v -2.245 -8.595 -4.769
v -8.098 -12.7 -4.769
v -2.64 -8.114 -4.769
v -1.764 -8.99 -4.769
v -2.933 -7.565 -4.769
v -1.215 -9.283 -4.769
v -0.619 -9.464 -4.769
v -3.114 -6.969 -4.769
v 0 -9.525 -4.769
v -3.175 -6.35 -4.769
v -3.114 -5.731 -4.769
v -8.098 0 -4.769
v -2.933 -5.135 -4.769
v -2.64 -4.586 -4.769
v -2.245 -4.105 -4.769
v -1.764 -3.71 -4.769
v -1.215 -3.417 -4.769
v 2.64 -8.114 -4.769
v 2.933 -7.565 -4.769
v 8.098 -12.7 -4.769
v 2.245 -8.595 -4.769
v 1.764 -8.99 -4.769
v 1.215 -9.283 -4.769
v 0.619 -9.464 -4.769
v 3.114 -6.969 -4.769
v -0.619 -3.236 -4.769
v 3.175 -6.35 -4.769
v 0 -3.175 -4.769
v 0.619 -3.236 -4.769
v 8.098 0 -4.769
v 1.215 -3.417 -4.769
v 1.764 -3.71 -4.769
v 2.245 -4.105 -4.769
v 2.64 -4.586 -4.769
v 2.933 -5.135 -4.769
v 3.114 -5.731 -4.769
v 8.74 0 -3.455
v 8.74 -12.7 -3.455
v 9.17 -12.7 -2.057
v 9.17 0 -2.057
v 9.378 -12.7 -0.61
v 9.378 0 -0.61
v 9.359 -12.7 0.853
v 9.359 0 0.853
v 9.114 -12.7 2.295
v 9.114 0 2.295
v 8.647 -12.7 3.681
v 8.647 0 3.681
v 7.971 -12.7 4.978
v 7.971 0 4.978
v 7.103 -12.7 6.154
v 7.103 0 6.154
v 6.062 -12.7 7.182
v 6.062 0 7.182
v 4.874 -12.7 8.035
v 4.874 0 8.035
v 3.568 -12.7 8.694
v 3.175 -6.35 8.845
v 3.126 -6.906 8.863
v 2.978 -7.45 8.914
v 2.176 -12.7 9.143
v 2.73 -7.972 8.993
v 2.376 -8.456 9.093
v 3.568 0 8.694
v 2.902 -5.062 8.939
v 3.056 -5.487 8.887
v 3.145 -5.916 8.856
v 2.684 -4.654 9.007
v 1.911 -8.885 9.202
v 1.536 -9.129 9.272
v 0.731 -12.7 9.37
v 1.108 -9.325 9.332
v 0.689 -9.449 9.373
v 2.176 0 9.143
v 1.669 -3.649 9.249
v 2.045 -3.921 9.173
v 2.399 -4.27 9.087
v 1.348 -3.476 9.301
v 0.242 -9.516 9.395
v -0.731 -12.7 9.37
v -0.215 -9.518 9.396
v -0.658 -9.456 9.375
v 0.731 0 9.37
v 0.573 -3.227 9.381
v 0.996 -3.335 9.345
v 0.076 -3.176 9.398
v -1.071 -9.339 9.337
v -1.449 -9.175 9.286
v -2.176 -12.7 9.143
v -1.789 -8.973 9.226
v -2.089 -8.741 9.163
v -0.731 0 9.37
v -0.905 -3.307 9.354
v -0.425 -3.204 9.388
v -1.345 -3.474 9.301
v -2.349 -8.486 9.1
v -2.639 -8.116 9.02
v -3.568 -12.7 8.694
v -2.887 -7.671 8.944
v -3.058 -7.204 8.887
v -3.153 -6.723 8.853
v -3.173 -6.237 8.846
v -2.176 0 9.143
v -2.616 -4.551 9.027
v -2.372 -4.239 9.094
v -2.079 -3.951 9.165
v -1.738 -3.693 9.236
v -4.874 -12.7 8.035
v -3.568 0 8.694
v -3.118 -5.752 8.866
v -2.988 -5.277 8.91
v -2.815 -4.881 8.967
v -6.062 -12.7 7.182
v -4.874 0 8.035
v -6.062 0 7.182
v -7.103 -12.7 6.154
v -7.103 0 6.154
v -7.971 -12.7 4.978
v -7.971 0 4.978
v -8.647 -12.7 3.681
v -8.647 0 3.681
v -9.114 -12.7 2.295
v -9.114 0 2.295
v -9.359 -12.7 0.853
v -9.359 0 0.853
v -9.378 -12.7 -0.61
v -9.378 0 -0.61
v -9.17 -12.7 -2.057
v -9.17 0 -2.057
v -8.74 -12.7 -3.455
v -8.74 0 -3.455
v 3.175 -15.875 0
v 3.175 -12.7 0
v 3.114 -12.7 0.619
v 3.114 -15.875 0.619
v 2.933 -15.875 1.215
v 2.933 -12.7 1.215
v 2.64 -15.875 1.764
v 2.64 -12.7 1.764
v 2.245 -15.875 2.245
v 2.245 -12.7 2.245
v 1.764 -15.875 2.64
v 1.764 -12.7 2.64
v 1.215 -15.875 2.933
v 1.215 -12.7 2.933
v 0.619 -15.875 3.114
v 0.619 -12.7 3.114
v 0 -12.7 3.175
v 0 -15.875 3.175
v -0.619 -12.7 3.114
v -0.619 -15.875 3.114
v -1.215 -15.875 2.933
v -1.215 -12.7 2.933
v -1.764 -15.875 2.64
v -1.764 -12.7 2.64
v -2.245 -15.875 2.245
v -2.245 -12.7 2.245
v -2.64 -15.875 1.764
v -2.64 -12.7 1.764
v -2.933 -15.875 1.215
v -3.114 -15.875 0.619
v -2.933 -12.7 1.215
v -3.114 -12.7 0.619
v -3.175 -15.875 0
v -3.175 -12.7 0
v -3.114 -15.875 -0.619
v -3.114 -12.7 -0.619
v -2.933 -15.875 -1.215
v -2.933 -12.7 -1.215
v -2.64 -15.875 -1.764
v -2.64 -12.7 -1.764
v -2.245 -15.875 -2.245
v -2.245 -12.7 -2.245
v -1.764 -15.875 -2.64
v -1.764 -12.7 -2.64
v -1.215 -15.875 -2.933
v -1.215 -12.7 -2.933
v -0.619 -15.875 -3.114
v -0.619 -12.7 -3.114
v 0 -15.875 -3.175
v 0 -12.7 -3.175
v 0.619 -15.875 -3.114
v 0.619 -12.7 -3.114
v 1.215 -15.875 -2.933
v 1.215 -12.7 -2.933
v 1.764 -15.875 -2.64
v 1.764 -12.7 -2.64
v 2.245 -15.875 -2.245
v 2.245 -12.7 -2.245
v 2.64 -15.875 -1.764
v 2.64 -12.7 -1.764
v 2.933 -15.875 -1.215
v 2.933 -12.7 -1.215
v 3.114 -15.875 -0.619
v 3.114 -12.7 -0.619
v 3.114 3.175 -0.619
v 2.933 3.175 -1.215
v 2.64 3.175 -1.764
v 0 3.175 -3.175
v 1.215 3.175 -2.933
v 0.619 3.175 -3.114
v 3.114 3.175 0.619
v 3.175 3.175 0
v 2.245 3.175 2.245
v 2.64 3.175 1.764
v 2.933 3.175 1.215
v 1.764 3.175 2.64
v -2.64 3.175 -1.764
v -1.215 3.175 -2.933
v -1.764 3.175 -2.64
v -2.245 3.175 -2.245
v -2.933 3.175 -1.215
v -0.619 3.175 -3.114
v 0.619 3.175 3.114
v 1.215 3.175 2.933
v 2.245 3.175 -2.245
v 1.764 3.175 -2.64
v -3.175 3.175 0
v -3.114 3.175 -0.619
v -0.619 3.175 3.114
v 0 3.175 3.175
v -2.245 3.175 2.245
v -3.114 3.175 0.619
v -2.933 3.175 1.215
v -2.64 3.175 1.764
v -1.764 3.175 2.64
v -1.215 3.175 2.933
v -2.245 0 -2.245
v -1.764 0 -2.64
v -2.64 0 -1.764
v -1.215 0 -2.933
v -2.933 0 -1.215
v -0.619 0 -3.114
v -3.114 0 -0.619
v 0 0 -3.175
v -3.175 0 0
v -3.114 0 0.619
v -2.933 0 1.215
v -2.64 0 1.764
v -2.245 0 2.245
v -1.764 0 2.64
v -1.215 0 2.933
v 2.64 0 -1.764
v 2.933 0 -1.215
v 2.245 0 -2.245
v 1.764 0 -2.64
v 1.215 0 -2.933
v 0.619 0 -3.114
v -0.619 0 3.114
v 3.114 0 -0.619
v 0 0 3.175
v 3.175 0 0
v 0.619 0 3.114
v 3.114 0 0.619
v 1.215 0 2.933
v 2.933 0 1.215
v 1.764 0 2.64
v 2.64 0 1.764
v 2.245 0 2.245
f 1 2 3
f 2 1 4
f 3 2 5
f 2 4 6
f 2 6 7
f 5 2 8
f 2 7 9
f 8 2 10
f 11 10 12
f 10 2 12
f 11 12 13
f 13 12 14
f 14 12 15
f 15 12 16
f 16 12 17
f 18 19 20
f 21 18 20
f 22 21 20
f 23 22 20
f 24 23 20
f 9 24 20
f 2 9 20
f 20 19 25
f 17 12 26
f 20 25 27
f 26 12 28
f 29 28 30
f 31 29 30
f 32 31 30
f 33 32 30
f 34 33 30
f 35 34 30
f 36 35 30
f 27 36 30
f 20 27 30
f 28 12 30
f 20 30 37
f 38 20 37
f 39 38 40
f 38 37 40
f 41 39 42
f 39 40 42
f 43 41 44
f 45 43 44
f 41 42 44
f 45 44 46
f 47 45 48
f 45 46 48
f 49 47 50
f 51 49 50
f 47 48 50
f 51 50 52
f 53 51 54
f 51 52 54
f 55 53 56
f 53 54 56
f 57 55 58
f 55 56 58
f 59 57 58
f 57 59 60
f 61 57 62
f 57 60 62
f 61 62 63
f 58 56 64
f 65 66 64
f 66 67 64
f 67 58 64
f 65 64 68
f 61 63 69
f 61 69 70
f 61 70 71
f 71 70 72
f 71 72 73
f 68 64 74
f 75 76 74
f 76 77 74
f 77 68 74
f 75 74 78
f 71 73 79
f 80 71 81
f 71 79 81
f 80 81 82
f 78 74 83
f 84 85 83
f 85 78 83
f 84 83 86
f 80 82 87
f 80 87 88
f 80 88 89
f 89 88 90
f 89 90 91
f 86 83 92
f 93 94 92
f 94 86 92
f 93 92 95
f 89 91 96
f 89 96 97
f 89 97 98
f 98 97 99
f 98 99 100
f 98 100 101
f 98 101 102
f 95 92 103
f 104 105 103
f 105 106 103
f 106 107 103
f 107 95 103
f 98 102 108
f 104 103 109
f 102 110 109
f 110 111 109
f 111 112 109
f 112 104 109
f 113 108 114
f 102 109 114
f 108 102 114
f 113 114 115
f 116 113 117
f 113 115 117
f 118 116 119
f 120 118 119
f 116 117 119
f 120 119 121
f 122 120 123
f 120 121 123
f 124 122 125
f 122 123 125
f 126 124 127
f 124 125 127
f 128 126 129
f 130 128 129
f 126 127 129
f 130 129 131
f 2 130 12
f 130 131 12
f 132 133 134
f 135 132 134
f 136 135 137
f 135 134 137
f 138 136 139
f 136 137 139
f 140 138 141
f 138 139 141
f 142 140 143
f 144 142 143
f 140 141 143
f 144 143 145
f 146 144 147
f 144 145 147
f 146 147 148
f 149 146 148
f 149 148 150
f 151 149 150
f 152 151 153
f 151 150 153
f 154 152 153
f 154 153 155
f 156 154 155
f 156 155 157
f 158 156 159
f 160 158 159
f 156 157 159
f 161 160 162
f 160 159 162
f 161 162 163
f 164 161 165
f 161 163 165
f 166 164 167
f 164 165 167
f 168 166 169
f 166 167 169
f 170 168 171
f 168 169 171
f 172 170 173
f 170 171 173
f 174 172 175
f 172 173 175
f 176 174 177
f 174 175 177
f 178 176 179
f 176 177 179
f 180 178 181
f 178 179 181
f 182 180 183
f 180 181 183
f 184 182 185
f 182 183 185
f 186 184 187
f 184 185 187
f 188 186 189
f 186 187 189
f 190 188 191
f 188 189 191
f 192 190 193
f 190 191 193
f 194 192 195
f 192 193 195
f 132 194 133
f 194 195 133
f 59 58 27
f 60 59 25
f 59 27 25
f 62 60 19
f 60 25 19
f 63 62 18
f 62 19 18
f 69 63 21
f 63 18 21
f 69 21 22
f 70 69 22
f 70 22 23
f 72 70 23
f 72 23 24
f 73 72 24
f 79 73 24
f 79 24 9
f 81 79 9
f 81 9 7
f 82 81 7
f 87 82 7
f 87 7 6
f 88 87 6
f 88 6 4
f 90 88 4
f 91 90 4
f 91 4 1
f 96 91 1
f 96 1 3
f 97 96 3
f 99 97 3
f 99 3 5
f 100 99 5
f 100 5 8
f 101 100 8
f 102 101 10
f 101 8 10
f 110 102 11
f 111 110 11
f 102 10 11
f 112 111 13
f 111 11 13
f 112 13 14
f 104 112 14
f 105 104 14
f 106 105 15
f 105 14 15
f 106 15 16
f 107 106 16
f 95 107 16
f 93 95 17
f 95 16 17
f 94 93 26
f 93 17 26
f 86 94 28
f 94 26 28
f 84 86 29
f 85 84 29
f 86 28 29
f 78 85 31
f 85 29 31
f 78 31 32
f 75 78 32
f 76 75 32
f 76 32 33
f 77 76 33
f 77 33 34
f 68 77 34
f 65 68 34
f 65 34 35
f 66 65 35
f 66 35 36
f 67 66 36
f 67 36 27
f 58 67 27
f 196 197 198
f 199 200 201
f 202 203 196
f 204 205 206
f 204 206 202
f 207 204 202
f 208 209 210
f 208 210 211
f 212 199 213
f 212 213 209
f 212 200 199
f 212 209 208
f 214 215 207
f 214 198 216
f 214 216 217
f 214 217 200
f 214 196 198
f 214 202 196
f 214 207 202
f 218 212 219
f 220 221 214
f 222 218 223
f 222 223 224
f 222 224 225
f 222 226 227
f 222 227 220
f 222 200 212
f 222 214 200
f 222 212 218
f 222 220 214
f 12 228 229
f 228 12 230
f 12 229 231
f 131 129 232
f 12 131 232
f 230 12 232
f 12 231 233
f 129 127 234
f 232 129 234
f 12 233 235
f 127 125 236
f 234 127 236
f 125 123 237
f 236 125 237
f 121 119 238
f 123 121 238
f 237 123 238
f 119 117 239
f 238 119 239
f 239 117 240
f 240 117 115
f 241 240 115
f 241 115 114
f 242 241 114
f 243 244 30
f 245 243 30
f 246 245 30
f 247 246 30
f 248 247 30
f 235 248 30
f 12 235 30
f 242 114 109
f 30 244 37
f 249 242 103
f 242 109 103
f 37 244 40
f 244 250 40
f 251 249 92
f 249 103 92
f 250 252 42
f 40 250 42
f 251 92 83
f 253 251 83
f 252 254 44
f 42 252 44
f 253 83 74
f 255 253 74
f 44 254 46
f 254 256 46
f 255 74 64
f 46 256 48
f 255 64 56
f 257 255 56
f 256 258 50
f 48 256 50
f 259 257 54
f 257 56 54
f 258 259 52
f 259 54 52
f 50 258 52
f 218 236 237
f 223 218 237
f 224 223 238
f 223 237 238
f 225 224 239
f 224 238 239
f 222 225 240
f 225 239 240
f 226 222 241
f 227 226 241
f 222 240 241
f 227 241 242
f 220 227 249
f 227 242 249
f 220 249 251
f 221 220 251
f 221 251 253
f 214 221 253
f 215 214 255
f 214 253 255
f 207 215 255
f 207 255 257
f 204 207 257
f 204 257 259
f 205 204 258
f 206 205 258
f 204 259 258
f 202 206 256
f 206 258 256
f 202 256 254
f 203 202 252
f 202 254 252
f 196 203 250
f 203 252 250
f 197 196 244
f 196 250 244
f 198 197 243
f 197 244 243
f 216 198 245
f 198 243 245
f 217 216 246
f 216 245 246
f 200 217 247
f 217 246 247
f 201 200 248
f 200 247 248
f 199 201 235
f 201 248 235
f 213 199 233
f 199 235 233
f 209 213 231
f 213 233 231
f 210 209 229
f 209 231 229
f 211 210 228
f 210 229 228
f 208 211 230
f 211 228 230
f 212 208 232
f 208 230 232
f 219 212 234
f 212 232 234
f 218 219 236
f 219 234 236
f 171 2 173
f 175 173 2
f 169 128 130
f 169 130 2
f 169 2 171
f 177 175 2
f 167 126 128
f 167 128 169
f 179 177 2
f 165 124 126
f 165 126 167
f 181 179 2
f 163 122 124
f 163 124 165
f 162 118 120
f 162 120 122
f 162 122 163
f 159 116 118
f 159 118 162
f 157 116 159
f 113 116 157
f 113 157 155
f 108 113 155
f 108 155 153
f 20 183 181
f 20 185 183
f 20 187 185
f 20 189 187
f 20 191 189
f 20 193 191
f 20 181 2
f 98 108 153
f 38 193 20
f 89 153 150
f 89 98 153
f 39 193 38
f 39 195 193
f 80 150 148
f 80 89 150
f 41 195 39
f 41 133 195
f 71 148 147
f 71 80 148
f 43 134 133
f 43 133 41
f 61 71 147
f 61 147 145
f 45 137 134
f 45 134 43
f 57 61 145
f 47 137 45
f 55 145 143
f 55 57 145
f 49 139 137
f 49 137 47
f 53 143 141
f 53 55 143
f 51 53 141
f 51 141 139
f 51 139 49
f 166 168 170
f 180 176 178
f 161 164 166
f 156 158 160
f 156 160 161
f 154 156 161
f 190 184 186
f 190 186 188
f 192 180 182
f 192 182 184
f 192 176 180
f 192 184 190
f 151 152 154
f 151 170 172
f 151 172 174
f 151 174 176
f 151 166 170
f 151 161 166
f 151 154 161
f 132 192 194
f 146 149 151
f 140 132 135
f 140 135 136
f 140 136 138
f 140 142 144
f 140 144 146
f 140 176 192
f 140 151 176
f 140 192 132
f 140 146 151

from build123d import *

# Parameters (mm, degrees)
F1_DEPTH      = 12.7
F2_R          = 3.175
F3_DEPTH      = 3.175
F4_R          = 3.175
F5_DEPTH      = 3.175
F6_R          = 3.175
F7_DEPTH      = 25.4
F7_DEPTH_BACK = 25.4


with BuildPart() as f1:
    # F0 (on Front) → F1 (new body)
    with BuildSketch(Plane.XZ):
        with BuildLine():
            Line((-8.097896, -4.769327), (8.097896, -4.769327))
            ThreePointArc((8.097896, -4.769327), (0, 9.398), (-8.097896, -4.769327))
        make_face()
    extrude(amount=F1_DEPTH)

    # F2 (on face) → F3 (join)
    with BuildSketch(Plane.XZ.offset(12.7)):
        Circle(F2_R)
    extrude(amount=F3_DEPTH)

    # F4 (on face) → F5 (join)
    with BuildSketch(Plane(origin=(0, 0, 0), x_dir=(-1, 0, 0), z_dir=(0, 1, 0))):
        Circle(F4_R)
    extrude(amount=F5_DEPTH)

    # F6 (on face) → F7 (cut, two sides)
    with BuildSketch(Plane(origin=(0, 0, -4.769327), x_dir=(1, 0, 0), z_dir=(0, 0, -1))) as f7_sk:
        with Locations((0, 6.35)):
            Circle(F6_R)
    extrude(amount=-F7_DEPTH, mode=Mode.SUBTRACT)
    extrude(f7_sk.sketch, amount=-F7_DEPTH_BACK, mode=Mode.SUBTRACT)


solid = f1.part
